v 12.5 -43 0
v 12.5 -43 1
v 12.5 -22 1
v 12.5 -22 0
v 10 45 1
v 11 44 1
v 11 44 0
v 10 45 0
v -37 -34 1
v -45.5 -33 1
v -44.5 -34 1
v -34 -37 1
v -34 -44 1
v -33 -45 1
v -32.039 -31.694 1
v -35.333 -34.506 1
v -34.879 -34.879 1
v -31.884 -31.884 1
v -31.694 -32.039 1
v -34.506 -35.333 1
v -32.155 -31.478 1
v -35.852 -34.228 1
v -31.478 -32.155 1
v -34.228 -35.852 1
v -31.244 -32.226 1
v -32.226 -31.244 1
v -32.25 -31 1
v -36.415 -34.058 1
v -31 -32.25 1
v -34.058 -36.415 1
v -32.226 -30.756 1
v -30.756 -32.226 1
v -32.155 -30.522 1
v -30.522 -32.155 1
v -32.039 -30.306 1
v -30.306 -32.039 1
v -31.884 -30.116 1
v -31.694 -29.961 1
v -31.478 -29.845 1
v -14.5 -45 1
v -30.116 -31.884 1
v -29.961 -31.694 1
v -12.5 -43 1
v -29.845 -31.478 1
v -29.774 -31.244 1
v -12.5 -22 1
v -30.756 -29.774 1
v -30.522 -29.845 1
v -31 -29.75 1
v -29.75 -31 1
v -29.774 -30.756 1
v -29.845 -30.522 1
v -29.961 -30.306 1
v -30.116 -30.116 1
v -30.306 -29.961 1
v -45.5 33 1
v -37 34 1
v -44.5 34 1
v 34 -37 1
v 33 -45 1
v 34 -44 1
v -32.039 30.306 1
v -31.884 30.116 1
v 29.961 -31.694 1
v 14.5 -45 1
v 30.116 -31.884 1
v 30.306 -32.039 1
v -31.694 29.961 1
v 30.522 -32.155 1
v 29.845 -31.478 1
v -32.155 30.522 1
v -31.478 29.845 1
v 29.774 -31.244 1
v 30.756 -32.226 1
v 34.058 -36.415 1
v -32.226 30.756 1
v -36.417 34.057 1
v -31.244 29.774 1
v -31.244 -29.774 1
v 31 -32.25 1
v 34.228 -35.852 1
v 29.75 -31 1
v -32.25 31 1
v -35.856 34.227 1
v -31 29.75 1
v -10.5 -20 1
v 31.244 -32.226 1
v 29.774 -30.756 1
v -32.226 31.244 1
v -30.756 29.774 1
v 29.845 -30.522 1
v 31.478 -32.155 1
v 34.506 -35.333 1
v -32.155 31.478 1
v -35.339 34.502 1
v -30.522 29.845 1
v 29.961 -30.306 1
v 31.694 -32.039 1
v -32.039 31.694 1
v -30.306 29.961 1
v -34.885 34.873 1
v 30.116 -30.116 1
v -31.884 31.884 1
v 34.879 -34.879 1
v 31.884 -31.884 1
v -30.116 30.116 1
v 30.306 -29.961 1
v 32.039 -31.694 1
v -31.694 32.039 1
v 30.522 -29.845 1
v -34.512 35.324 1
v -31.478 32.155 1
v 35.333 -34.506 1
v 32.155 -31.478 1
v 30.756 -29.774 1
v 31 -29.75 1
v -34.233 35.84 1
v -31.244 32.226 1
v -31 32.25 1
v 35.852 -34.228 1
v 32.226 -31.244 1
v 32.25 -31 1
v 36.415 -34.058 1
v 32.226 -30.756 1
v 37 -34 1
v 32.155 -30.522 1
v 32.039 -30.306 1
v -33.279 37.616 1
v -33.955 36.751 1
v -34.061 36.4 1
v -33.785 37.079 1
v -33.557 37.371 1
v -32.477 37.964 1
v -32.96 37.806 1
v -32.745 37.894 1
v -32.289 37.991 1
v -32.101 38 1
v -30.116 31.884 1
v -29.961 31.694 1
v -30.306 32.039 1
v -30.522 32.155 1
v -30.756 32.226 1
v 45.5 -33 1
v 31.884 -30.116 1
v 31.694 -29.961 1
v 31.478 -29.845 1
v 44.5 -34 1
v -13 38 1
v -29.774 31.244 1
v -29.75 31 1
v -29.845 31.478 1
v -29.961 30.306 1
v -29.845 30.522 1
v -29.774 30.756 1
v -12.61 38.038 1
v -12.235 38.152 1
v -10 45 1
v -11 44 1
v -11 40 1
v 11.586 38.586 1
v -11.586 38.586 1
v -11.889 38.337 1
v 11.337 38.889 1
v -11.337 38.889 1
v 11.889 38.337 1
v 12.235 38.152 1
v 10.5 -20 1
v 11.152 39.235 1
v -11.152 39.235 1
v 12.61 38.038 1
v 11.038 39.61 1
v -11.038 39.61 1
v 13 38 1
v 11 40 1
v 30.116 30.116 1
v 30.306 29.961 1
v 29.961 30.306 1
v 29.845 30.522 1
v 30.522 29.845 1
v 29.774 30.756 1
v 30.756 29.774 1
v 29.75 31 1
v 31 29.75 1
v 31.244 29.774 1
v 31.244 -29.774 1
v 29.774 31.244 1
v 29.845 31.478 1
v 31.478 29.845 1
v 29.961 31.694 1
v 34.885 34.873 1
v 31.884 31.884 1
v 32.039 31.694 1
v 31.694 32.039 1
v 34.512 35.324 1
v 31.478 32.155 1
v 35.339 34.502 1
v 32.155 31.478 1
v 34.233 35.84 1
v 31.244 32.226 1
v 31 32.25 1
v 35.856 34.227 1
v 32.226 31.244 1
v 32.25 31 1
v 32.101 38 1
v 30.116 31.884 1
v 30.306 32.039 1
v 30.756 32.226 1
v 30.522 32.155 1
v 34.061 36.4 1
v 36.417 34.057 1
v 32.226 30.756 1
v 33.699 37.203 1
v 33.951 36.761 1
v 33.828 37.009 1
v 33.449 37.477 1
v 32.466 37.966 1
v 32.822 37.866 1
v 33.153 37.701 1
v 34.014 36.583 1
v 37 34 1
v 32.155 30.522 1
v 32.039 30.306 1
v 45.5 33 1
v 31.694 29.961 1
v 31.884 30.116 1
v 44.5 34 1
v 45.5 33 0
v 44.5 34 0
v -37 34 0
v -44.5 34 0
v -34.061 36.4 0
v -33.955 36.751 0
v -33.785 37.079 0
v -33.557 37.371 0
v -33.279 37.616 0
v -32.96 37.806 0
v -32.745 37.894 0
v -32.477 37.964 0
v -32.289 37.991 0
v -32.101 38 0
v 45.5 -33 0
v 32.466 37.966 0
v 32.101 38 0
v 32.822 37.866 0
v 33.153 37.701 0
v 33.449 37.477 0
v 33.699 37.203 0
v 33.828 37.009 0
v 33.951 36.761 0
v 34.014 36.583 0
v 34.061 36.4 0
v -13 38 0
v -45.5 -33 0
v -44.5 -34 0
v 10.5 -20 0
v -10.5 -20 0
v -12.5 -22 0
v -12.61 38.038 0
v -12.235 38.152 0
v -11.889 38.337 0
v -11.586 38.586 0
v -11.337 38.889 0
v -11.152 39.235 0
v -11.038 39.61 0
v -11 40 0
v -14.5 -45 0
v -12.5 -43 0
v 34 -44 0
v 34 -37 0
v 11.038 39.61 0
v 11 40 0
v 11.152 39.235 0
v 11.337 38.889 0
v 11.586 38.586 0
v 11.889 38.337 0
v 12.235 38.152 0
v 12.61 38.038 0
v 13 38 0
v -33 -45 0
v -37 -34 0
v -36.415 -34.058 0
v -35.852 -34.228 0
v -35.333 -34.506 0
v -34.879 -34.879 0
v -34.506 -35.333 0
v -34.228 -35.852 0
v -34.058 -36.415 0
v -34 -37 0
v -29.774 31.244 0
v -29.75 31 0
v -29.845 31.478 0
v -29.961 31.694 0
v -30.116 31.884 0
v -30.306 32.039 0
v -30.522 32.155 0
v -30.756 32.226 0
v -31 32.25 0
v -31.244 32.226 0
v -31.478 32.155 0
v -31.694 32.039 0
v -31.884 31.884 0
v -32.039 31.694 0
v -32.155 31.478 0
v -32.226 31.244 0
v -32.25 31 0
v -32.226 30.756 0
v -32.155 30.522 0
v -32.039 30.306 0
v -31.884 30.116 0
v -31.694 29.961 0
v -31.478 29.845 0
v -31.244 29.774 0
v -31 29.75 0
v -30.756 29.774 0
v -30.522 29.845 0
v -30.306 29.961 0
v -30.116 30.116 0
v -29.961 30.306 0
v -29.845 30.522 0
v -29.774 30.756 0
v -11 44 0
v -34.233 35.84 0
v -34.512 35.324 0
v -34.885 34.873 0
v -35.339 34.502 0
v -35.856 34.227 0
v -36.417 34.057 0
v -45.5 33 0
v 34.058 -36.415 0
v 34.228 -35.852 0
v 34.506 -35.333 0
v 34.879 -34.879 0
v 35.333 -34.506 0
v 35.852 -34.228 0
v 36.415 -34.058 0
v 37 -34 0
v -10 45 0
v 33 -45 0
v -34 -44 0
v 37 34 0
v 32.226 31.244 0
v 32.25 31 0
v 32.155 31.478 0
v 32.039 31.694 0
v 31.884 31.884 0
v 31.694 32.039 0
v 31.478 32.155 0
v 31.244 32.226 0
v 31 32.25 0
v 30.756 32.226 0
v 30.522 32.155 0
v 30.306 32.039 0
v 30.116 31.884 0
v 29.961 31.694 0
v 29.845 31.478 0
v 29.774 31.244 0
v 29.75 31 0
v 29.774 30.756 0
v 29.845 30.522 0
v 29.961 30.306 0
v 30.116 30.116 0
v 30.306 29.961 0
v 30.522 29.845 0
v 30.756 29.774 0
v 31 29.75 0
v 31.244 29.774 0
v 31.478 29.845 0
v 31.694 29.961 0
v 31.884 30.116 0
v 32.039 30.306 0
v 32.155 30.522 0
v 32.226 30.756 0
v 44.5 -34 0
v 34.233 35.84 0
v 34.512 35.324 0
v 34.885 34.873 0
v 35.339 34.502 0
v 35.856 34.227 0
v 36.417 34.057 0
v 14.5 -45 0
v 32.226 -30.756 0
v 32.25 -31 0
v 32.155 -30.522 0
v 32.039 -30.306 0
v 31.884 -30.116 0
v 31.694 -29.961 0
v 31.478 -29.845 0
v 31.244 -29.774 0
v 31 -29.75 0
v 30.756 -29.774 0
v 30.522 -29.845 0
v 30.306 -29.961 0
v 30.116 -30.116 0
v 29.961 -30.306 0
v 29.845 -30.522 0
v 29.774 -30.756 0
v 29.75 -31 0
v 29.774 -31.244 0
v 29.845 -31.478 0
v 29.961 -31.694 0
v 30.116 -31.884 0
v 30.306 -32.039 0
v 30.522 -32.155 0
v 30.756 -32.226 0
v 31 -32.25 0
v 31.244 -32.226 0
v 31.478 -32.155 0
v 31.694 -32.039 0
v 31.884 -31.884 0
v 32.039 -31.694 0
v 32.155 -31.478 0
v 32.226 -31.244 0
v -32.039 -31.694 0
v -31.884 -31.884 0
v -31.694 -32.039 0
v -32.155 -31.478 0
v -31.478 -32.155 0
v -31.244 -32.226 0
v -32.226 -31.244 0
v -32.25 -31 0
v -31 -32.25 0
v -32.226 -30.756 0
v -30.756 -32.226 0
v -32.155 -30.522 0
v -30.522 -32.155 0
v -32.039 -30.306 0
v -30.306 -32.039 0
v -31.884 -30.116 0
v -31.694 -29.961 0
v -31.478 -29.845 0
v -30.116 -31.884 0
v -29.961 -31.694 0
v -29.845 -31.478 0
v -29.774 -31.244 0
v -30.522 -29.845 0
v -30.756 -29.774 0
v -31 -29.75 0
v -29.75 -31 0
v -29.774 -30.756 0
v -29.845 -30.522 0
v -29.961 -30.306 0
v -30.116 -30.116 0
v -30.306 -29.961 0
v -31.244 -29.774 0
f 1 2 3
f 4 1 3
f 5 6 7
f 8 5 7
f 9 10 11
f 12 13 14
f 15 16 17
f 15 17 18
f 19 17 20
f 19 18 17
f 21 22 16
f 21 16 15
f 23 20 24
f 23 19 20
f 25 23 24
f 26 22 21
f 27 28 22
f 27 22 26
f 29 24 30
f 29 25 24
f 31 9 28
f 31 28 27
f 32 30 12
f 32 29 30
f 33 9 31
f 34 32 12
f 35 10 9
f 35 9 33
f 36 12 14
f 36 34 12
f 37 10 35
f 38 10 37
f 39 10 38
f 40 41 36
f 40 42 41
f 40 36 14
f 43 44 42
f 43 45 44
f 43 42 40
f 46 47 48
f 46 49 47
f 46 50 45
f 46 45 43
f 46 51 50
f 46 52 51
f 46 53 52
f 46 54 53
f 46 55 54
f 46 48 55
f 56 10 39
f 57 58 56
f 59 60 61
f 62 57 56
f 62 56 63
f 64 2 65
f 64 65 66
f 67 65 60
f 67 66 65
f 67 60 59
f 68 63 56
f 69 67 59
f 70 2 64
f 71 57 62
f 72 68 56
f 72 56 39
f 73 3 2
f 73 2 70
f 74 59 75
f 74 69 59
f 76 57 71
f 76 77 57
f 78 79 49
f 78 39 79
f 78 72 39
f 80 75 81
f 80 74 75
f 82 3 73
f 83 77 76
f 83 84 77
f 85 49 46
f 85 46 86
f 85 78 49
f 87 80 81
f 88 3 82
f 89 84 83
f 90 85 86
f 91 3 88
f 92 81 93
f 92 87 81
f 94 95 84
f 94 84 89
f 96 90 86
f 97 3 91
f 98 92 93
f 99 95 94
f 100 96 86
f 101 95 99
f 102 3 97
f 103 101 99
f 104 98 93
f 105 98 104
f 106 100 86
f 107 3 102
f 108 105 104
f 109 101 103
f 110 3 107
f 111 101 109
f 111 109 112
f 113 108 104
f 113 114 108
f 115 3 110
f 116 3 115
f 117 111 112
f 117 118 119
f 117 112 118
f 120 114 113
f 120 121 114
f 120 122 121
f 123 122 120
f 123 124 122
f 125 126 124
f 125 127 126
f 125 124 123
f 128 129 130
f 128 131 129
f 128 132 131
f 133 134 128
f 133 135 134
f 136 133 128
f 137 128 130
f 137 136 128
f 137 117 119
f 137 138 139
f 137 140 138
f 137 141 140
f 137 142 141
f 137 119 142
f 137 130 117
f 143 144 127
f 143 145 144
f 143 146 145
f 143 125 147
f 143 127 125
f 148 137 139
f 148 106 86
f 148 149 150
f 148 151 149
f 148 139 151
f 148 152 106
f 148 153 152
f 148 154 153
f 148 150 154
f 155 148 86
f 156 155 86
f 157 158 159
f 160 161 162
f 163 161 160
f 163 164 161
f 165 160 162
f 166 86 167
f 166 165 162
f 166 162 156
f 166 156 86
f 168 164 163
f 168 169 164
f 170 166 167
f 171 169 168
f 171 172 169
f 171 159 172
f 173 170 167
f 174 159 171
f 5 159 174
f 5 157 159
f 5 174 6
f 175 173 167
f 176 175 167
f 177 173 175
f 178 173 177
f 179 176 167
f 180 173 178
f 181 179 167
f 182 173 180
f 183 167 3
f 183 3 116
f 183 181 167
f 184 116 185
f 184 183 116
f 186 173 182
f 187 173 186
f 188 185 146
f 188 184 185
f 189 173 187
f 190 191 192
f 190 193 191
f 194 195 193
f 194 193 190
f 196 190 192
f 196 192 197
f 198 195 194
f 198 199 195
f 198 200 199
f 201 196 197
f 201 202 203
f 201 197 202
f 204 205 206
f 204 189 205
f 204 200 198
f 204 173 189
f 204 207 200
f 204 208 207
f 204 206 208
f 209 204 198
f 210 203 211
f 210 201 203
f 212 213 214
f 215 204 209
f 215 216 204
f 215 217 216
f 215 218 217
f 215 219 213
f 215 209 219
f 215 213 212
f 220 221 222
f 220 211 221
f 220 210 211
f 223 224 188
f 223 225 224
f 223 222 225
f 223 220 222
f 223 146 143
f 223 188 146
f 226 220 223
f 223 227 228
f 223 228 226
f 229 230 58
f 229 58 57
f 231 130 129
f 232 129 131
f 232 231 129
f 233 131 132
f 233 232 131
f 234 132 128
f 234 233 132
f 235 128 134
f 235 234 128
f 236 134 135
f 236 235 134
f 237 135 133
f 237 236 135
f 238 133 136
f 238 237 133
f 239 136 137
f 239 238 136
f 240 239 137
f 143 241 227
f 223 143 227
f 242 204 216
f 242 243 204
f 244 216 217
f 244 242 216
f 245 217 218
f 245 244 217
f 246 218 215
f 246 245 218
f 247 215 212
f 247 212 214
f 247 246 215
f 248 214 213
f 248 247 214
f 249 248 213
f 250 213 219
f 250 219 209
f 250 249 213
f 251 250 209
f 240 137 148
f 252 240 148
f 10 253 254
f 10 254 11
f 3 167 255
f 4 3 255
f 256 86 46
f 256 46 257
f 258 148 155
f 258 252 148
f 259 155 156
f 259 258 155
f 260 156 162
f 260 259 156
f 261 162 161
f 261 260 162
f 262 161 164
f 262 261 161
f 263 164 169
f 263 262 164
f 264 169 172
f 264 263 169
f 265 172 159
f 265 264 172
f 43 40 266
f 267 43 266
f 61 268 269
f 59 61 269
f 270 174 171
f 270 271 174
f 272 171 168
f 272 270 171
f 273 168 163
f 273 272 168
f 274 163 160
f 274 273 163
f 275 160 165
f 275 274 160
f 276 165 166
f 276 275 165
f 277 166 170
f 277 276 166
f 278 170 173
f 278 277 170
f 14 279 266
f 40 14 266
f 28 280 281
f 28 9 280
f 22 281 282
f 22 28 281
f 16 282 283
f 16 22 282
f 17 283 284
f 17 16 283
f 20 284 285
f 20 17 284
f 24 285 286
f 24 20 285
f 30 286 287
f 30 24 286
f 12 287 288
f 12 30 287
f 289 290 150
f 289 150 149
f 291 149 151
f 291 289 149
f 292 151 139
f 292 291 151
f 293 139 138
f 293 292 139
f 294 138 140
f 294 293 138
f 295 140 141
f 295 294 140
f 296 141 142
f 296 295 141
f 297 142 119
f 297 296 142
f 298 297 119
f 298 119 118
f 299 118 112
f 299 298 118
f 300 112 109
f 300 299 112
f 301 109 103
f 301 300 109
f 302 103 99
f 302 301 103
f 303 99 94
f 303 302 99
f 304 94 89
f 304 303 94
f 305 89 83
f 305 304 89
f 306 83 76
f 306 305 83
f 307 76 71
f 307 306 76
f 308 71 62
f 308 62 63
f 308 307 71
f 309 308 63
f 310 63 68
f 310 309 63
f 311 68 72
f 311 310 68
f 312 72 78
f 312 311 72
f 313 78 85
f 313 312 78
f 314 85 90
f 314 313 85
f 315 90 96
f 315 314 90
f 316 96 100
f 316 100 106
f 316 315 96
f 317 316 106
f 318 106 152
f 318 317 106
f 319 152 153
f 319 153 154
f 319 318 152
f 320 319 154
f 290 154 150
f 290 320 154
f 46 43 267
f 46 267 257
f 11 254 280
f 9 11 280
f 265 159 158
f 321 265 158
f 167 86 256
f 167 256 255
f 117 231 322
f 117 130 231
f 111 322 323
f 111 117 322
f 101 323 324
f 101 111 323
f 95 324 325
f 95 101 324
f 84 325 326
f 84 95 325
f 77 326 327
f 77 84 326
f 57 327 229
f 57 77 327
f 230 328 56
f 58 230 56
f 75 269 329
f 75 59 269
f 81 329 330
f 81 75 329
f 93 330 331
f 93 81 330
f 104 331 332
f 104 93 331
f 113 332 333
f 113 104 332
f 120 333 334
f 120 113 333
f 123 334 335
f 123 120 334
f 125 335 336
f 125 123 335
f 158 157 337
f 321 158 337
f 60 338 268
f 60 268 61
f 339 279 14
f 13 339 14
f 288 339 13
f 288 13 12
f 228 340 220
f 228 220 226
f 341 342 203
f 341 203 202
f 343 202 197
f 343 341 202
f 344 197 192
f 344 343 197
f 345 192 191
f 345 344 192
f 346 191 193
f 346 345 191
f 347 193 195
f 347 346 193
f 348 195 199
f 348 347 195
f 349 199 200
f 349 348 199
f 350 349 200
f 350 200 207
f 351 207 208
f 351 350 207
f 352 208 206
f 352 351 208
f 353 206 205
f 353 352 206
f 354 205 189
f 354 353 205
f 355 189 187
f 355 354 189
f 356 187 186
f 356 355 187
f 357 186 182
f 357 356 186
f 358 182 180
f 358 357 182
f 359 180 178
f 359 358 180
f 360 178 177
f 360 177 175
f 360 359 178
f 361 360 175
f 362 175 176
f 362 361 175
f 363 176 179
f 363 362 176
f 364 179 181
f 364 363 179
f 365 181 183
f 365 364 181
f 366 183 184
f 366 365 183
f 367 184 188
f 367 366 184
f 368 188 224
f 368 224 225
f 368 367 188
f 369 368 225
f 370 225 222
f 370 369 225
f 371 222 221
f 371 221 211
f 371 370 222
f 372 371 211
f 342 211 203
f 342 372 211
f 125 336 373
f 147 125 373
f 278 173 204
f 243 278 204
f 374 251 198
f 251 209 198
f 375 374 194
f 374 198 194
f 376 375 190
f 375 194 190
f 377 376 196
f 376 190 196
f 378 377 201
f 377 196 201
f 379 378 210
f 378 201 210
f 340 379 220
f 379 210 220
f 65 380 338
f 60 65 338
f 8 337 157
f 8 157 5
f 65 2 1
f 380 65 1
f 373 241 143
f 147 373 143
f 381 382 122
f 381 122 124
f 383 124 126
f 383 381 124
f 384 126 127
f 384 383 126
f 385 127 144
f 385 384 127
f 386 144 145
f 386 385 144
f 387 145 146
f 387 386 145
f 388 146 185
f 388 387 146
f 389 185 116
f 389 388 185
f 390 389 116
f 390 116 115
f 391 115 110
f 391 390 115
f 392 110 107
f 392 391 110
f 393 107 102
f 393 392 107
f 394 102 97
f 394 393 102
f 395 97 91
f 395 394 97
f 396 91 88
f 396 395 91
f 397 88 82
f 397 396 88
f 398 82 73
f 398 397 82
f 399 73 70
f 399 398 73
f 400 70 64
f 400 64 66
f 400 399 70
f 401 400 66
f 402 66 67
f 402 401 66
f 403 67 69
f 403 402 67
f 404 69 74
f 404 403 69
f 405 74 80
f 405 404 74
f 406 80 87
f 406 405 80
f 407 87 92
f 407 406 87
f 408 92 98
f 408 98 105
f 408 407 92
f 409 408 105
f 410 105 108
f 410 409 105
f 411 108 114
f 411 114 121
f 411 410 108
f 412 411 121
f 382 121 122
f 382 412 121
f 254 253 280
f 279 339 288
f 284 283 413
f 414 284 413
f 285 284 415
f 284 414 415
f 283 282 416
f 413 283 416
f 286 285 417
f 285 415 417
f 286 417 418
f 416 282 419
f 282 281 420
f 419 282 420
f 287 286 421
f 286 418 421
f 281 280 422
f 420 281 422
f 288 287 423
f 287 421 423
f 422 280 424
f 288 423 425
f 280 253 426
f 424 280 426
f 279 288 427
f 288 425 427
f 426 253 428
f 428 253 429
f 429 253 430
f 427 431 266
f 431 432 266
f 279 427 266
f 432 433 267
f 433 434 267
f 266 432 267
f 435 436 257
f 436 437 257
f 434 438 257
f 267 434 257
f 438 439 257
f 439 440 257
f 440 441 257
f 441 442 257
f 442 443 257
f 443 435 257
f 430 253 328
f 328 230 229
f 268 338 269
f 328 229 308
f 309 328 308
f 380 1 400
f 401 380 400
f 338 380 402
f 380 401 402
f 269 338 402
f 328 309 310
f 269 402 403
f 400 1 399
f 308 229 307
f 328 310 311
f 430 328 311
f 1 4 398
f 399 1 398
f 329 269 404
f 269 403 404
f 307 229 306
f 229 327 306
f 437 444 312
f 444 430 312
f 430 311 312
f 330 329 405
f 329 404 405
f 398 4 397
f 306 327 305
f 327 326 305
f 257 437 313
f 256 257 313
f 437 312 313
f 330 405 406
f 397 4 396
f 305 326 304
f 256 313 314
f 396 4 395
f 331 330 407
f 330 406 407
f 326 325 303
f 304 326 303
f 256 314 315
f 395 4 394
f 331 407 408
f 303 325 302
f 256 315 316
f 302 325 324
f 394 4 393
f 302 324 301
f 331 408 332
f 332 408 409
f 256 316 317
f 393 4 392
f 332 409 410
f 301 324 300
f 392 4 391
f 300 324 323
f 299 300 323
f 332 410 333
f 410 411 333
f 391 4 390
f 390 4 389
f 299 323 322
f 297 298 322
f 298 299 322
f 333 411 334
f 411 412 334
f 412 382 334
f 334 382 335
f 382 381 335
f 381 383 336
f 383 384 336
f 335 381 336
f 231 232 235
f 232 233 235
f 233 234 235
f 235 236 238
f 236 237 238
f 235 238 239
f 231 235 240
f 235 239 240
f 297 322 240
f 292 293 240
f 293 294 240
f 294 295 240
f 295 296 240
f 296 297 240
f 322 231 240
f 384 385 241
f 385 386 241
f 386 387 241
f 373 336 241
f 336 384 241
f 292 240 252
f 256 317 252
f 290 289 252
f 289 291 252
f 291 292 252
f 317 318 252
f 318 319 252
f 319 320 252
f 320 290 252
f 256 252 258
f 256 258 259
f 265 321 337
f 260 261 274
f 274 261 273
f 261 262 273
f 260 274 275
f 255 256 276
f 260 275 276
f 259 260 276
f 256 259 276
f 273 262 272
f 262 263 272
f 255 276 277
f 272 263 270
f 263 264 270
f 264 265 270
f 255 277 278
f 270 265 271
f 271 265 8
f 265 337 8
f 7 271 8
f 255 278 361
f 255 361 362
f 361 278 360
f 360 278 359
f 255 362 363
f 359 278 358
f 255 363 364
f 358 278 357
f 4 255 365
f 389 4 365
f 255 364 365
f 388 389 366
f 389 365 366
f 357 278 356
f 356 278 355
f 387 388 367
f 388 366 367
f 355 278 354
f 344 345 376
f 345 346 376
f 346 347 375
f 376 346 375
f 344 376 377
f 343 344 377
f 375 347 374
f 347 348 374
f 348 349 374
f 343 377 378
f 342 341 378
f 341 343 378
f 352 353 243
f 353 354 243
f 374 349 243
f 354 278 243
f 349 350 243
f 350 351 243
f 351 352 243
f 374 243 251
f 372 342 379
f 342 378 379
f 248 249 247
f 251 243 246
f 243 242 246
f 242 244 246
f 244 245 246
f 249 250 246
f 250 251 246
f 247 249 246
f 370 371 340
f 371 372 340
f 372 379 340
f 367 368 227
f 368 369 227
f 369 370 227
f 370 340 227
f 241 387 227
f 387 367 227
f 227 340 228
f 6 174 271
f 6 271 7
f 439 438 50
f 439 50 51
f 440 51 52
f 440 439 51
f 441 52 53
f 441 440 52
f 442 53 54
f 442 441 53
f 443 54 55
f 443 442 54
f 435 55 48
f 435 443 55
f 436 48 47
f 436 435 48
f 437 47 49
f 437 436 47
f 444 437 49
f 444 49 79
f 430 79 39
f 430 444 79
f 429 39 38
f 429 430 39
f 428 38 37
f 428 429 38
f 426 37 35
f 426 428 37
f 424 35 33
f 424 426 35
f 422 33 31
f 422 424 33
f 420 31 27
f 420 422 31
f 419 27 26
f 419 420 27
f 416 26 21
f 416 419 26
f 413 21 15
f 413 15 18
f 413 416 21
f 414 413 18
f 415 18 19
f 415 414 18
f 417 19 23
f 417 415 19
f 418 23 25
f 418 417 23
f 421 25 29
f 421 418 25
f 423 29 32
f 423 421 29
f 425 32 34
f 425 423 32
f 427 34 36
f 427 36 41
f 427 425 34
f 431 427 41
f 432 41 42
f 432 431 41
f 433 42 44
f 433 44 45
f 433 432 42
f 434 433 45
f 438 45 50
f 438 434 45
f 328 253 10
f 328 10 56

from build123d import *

# Parameters (mm, degrees)
SKETCH_1_W          = 68
SKETCH_1_H          = 68
SKETCH_1_R          = 1.25
SKETCH_1_H_2        = 11
SKETCH_1_W_2        = 11.5
EXTRUDE_2_DEPTH     = 1
FILLET_1_R          = 3
SKETCH_3_W          = 25
SKETCH_3_H          = 25
CUT_EXTRUDE_1_DEPTH = 2
CHAMFER_1_SIZE      = 2
SKETCH_5_W          = 23
SKETCH_5_H          = 7
CUT_EXTRUDE_2_DEPTH = 2
FILLET_2_R          = 2
CHAMFER_2_SIZE      = 1


with BuildPart() as part:
    # ｽｹｯﾁ1 → ﾎﾞｽ - 押し出し2 (new body)
    with BuildSketch(Plane.XY):
        Rectangle(SKETCH_1_W, SKETCH_1_H)
        with Locations((-31, -31)):
            Circle(SKETCH_1_R, mode=Mode.SUBTRACT)
        with Locations((31, -31)):
            Circle(SKETCH_1_R, mode=Mode.SUBTRACT)
        with Locations((-31, 31)):
            Circle(SKETCH_1_R, mode=Mode.SUBTRACT)
        with Locations((31, 31)):
            Circle(SKETCH_1_R, mode=Mode.SUBTRACT)
        with Locations((0, 39.5)):
            Rectangle(SKETCH_1_W, SKETCH_1_H_2)
        with Locations((-39.75, 0)):
            Rectangle(SKETCH_1_W_2, SKETCH_1_H)
        with Locations((39.75, 0)):
            Rectangle(SKETCH_1_W_2, SKETCH_1_H)
        with Locations((0, -39.5)):
            Rectangle(SKETCH_1_W, SKETCH_1_H_2)
    extrude(amount=EXTRUDE_2_DEPTH)

    # ﾌｨﾚｯﾄ1
    fillet_1_edges = [part.edges().sort_by_distance(p)[0] for p in [
        (-34, -34, 0.5),
        (-34, 34, 0.5),
        (34, 34, 0.5),
        (34, -34, 0.5),
    ]]
    fillet(fillet_1_edges, radius=FILLET_1_R)

    # ｽｹｯﾁ3 → ｶｯﾄ - 押し出し1 (cut, through all)
    with BuildSketch(Plane.XY.offset(1)):
        with Locations((0, -32.5)):
            Rectangle(SKETCH_3_W, SKETCH_3_H)
    extrude(amount=-CUT_EXTRUDE_1_DEPTH, mode=Mode.SUBTRACT)

    # 面取り1
    chamfer_1_edges = [part.edges().sort_by_distance(p)[0] for p in [
        (-12.5, -45, 0.5),
        (-12.5, -20, 0.5),
        (12.5, -20, 0.5),
        (12.5, -45, 0.5),
    ]]
    chamfer(chamfer_1_edges, length=CHAMFER_1_SIZE)

    # ｽｹｯﾁ5 → ｶｯﾄ - 押し出し2 (cut, through all)
    with BuildSketch(Plane.XY.offset(1)):
        with Locations((-22.5, 41.5)):
            Rectangle(SKETCH_5_W, SKETCH_5_H)
        with Locations((22.5, 41.5)):
            Rectangle(SKETCH_5_W, SKETCH_5_H)
    extrude(amount=-CUT_EXTRUDE_2_DEPTH, mode=Mode.SUBTRACT)

    # ﾌｨﾚｯﾄ2
    fillet_2_edges = [part.edges().sort_by_distance(p)[0] for p in [
        (11, 38, 0.5),
        (34, 38, 0.5),
        (-11, 38, 0.5),
        (-34, 38, 0.5),
    ]]
    fillet(fillet_2_edges, radius=FILLET_2_R)

    # 面取り2
    chamfer_2_edges = [part.edges().sort_by_distance(p)[0] for p in [
        (-11, 45, 0.5),
        (11, 45, 0.5),
        (34, -45, 0.5),
        (-34, -45, 0.5),
        (-45.5, -34, 0.5),
        (-45.5, 34, 0.5),
        (45.5, 34, 0.5),
        (45.5, -34, 0.5),
    ]]
    chamfer(chamfer_2_edges, length=CHAMFER_2_SIZE)


solid = part.part
